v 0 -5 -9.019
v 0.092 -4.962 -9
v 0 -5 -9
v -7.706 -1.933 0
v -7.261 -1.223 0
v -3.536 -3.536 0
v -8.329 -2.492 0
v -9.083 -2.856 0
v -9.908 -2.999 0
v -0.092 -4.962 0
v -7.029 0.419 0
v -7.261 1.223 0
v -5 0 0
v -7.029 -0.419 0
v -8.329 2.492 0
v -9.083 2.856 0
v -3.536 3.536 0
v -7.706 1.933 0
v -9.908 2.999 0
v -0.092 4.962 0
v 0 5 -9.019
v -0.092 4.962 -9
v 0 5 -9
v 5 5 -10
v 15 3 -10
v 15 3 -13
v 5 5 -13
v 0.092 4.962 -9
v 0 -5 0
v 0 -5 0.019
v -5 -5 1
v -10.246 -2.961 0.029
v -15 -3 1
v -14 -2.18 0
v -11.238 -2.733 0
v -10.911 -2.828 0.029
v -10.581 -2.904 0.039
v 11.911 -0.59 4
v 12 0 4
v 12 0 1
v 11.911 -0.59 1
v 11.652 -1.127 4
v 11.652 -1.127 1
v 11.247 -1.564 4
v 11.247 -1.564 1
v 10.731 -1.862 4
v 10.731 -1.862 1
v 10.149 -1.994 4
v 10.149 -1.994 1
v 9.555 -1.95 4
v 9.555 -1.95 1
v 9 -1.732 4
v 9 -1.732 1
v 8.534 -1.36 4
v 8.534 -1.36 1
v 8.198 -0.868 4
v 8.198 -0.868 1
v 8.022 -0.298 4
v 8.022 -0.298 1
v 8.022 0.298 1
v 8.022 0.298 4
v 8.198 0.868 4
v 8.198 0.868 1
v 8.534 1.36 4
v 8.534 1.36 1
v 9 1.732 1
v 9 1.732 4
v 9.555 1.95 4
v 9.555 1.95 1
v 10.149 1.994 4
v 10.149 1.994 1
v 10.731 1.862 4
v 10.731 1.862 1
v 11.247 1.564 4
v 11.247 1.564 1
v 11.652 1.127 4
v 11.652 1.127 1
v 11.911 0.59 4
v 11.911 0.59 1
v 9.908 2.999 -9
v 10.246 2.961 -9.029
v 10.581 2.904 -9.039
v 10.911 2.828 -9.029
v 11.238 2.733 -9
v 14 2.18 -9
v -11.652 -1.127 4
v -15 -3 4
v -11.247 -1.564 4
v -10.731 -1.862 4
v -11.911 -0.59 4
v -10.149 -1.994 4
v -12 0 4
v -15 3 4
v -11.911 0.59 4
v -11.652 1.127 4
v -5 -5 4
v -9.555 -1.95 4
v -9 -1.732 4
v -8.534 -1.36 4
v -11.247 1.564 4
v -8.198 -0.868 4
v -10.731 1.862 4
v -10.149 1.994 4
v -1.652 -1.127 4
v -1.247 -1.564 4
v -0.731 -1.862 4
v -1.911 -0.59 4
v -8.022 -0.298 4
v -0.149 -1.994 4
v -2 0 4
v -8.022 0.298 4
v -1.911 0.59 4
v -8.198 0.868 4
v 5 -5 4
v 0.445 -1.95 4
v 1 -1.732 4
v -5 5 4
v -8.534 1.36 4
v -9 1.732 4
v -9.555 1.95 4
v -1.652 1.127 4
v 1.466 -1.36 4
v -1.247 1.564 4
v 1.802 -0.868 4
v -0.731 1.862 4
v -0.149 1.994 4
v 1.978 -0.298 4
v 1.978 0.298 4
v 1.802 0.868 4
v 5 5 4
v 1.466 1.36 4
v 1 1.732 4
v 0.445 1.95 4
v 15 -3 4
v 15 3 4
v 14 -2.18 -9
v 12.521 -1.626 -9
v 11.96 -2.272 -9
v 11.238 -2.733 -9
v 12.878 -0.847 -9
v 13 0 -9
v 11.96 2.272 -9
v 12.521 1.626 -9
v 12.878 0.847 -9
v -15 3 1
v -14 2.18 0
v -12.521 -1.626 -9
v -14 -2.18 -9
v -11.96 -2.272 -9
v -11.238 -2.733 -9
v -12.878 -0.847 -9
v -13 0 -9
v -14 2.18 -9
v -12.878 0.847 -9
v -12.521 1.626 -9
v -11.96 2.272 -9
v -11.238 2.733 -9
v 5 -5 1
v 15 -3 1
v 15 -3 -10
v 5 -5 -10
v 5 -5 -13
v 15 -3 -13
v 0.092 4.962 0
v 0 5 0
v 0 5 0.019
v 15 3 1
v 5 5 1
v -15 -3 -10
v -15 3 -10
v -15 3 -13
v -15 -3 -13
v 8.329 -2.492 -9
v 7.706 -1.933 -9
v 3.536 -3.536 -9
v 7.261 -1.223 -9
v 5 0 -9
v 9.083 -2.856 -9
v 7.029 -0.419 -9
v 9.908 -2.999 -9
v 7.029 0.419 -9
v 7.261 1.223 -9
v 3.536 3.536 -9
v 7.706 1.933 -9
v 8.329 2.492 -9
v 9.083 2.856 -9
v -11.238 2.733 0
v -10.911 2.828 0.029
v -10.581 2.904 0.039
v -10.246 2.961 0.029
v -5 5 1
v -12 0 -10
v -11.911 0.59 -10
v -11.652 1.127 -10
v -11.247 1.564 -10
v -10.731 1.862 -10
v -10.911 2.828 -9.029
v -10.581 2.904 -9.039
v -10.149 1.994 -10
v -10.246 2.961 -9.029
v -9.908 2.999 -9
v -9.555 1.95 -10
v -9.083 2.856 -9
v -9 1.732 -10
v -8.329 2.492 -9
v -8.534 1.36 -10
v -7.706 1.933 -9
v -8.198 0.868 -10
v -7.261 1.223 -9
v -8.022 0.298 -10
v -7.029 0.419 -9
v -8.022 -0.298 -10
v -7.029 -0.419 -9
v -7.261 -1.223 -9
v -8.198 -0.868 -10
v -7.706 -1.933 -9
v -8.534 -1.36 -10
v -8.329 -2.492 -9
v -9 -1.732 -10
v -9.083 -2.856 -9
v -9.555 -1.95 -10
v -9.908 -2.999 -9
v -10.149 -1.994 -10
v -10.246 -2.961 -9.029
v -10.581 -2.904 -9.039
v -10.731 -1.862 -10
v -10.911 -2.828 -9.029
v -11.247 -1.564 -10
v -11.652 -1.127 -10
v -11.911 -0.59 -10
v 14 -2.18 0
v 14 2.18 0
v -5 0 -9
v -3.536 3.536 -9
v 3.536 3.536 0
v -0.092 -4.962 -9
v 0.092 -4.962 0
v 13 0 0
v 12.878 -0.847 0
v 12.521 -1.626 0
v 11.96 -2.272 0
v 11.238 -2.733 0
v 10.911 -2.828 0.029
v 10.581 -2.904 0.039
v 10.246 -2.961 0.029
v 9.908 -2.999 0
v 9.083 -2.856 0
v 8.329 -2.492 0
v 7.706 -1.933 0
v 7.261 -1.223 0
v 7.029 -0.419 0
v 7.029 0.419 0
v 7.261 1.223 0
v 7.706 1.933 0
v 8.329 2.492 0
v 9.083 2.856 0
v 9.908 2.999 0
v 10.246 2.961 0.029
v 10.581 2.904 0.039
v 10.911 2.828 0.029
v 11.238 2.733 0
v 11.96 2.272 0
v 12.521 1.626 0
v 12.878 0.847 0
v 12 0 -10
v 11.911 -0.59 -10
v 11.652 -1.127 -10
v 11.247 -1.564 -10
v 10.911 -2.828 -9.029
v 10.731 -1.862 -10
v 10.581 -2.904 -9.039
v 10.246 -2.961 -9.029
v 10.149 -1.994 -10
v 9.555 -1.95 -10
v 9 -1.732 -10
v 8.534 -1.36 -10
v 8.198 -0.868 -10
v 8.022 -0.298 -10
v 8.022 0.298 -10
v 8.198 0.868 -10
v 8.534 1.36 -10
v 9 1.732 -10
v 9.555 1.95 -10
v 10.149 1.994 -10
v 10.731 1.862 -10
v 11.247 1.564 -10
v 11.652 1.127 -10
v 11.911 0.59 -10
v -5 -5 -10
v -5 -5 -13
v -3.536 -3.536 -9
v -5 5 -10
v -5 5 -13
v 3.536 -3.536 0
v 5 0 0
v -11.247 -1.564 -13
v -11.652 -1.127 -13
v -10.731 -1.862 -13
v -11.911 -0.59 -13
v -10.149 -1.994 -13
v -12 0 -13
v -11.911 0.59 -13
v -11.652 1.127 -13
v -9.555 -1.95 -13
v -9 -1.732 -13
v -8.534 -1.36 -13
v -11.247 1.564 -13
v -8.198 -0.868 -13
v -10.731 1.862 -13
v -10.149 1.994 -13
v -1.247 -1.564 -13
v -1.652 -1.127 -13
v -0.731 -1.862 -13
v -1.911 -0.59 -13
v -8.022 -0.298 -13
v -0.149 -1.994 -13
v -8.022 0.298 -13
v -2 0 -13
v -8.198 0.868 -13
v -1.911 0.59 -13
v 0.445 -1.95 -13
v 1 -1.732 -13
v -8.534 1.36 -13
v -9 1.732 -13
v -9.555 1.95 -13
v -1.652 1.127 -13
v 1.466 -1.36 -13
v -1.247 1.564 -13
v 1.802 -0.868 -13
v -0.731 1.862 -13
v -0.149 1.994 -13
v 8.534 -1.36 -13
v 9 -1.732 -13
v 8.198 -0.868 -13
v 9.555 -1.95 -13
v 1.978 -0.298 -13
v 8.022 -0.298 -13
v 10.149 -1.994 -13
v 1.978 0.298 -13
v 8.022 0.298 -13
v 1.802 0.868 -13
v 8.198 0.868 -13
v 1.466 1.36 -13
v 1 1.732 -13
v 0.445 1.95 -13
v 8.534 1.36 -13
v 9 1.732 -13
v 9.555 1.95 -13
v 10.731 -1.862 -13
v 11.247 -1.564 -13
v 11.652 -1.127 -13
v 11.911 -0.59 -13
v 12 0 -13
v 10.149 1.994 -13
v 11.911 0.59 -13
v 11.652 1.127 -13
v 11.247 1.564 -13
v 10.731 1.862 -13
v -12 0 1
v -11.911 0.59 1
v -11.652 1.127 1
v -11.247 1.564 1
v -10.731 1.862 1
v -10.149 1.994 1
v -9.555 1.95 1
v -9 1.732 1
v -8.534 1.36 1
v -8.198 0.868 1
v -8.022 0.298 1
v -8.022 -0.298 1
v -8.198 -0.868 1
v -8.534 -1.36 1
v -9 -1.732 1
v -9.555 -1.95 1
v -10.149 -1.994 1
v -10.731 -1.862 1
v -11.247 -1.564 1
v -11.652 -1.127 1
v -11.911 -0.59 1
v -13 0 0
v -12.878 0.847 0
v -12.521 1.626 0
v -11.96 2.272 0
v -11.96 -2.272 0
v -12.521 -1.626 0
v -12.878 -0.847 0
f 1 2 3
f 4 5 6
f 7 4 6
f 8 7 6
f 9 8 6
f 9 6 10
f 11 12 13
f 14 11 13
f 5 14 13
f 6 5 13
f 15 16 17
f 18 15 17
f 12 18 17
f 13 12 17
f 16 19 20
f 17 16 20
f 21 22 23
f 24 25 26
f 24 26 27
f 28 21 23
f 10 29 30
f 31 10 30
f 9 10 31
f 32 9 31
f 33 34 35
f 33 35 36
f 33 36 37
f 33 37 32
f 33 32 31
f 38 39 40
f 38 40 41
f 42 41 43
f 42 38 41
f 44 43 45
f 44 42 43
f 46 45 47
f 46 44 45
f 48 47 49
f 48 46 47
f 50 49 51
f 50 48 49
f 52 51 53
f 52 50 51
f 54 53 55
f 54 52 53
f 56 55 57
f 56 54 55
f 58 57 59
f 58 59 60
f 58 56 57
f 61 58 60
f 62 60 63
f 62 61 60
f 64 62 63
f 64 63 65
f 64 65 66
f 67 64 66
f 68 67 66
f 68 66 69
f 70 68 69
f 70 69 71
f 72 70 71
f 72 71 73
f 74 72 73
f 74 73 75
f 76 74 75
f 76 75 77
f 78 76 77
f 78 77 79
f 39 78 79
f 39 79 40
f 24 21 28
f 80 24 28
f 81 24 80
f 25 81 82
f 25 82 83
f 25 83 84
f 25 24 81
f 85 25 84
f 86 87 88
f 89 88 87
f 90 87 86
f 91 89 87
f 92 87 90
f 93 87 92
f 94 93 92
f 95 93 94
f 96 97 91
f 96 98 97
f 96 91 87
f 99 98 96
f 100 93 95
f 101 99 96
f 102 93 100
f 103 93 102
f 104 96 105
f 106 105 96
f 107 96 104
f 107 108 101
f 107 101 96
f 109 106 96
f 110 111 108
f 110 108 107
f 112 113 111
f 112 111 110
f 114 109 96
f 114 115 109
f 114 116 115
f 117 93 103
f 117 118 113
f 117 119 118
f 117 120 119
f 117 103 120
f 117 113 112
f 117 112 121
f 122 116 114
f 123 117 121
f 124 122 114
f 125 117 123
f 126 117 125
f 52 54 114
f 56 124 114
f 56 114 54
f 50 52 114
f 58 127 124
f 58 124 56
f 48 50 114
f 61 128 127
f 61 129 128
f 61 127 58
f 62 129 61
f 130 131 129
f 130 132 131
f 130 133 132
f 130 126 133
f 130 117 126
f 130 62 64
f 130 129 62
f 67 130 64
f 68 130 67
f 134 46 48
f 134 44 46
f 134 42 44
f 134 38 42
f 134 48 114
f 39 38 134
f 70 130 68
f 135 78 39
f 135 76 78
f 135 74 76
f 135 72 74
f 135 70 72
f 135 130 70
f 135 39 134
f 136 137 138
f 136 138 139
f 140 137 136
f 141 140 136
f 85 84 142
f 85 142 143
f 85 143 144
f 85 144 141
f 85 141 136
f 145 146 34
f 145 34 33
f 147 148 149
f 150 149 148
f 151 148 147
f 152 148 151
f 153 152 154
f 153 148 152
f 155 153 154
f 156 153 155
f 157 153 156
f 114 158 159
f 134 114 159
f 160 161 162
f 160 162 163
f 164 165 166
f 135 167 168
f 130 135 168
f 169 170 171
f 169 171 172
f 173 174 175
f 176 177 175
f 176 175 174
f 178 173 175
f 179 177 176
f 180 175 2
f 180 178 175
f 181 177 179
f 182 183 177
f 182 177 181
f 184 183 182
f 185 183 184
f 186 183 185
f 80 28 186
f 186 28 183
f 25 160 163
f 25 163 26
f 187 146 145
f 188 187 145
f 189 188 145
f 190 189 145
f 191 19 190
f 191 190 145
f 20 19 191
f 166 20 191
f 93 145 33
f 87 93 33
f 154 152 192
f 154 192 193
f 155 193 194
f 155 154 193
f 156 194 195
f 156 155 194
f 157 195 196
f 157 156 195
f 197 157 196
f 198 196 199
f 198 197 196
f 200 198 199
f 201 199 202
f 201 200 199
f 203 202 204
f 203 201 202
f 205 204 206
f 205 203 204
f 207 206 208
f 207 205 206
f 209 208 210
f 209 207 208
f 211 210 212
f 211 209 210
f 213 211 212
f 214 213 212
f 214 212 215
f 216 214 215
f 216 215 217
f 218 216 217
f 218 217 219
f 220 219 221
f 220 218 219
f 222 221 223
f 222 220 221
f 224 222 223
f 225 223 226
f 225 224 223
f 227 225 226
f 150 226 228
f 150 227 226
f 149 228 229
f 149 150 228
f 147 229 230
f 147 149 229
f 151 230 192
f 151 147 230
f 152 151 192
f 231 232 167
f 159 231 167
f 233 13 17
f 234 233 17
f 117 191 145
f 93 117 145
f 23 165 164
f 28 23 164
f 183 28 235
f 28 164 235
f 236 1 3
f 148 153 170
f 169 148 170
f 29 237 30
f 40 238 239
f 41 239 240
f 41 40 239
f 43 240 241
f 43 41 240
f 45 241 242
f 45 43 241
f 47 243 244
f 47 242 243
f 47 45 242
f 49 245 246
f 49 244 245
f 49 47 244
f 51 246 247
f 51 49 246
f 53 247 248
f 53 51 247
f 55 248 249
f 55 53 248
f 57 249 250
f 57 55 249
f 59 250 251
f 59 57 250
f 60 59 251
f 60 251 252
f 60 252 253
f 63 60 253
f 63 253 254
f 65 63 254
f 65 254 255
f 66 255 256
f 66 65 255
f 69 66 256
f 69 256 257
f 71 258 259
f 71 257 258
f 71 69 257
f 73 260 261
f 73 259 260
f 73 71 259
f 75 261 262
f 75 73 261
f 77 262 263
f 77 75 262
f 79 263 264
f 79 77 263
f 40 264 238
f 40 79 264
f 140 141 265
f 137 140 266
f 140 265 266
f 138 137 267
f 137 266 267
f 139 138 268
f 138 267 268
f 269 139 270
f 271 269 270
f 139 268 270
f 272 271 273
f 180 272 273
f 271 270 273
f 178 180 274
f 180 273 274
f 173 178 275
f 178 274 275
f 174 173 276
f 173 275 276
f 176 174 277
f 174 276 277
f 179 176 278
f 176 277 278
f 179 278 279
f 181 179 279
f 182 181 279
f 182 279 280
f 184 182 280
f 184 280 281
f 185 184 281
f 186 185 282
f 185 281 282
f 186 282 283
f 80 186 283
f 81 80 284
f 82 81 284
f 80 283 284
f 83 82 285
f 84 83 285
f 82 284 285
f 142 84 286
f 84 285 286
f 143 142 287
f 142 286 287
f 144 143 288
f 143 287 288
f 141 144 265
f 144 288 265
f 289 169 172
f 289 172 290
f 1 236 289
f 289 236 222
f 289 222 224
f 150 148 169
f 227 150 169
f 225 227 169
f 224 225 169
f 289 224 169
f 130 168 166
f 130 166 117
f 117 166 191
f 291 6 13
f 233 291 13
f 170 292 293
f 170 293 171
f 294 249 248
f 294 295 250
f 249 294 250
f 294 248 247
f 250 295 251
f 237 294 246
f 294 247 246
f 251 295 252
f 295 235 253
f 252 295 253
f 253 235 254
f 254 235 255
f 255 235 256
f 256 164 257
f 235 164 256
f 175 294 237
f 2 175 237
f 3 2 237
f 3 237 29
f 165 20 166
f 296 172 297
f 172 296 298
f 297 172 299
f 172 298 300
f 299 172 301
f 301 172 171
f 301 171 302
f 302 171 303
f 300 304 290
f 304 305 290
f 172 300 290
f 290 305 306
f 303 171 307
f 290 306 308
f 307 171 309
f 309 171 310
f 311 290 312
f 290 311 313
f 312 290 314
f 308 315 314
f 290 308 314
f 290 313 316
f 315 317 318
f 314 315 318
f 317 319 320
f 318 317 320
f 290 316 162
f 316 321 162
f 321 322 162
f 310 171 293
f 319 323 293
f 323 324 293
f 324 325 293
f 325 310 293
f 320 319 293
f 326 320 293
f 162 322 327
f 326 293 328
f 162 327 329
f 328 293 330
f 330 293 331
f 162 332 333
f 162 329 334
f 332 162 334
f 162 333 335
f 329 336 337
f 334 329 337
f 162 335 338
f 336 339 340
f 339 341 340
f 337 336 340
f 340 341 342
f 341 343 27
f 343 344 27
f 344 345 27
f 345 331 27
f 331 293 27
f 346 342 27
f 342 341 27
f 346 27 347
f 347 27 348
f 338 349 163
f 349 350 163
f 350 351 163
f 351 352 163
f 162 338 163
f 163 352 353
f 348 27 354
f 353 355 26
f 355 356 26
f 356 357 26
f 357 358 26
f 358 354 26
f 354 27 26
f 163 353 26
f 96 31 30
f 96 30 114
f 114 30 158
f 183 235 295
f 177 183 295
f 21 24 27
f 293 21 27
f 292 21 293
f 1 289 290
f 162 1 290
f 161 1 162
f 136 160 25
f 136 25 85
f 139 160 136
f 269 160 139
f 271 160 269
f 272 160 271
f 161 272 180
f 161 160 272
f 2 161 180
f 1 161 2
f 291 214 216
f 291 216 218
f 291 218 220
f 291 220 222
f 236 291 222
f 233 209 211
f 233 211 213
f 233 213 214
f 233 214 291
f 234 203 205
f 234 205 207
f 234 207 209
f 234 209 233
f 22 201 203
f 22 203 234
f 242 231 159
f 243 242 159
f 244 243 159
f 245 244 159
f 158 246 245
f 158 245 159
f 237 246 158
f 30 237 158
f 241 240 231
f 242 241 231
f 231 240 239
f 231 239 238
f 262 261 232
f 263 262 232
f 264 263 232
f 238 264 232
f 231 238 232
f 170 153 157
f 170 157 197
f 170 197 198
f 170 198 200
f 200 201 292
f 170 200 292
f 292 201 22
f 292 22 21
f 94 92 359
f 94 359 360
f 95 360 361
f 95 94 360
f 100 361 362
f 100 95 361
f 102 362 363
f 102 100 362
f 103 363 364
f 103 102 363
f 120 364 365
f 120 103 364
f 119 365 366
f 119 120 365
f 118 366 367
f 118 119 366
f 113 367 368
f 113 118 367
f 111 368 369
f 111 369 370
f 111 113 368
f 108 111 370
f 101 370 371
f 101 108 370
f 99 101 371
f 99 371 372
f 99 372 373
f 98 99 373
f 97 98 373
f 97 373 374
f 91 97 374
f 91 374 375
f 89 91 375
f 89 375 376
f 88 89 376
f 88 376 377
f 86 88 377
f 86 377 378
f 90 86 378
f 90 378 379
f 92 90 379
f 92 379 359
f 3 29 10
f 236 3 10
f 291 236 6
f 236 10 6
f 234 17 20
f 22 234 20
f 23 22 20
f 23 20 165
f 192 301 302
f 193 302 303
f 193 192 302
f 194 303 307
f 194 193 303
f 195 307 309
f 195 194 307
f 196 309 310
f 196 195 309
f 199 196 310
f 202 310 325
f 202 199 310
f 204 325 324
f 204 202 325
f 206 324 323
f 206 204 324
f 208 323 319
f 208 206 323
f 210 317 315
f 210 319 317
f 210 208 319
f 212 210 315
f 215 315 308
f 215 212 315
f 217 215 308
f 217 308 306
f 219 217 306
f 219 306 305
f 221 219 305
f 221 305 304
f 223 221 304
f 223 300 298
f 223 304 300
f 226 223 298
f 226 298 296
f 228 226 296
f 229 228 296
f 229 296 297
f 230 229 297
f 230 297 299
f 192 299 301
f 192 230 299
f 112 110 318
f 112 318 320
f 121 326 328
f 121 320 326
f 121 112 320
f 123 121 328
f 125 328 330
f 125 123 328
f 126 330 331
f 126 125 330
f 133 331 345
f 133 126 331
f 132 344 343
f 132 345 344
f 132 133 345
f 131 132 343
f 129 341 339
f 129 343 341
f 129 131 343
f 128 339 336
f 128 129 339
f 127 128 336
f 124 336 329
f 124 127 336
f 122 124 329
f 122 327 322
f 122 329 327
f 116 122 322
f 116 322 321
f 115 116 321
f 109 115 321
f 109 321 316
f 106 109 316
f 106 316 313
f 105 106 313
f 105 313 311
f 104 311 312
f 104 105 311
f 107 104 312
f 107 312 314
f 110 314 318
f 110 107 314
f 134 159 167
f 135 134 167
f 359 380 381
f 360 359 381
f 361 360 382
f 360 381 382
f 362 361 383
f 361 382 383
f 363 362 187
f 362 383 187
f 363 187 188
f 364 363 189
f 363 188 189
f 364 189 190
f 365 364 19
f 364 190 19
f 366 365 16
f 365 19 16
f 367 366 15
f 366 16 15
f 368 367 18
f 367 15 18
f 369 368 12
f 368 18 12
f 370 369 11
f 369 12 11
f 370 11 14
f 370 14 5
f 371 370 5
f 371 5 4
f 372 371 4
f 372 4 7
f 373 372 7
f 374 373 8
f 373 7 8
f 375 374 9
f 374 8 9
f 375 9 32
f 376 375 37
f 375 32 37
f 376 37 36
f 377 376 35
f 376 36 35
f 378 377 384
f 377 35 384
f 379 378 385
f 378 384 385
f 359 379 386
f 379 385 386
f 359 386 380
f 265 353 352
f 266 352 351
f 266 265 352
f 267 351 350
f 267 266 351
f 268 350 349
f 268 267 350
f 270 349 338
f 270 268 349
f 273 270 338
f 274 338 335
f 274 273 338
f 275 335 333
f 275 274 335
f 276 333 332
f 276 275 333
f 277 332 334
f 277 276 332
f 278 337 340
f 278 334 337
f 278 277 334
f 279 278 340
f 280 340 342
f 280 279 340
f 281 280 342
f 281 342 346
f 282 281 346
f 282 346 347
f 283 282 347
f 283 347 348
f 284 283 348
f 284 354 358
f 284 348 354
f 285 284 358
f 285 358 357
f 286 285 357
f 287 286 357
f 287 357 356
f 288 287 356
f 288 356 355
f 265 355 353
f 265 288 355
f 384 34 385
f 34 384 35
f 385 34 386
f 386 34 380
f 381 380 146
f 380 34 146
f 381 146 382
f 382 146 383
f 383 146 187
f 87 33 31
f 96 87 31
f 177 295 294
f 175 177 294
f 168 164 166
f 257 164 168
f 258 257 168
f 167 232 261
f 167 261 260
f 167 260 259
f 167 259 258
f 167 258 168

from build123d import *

# Parameters (mm, degrees)
EXTRUDE_1_DEPTH          = 4
EXTRUDE_2_DEPTH          = 9
CHAMFER_1_SIZE           = 1
CHAMFER_2_SIZE           = 1
CHAMFER_3_SIZE           = 1
CHAMFER_4_SIZE           = 1
CUT_EXTRUDE_1_DEPTH      = 24.216373532
CUT_EXTRUDE_1_DEPTH_BACK = 24.216373532
SKETCH_4_R               = 2
CHAMFER_5_SIZE           = 1


with BuildPart() as part:
    # 草图1 → 凸台-拉伸1 (new body)
    with BuildSketch(Plane.XY):
        Polygon((15, -3), (15, 3), (5, 5), (-5, 5), (-15, 3), (-15, -3), (-5, -5), (5, -5), align=None)
    extrude_1 = extrude(amount=EXTRUDE_1_DEPTH)

    # 草图2 → 凸台-拉伸2 (add)
    with BuildSketch(Plane(origin=(0, 0, 0), x_dir=(-1, 0, 0), z_dir=(0, 0, -1))):
        Polygon((0, 5), (-3.535533906, 3.535533906), (-5, 0), (-3.535533906, -3.535533906), (0, -5), (3.535533906, -3.535533906), (5, 0), (3.535533906, 3.535533906), align=None)
    extrude(amount=EXTRUDE_2_DEPTH)

    # 镜向1: 凸台-拉伸1 across plane
    add(extrude_1.mirror(Plane(origin=(0, 0, -4.5), x_dir=(1, 0, 0), z_dir=(0, 0, -1))))

    # 倒角1
    # the kernel refuses this chamfer: 1 mm, written as the material it takes off along each edge
    with BuildSketch(Plane(origin=(-17.521742642, -2.495651472, 0), x_dir=(0.19611613513818427, 0.9805806756909201, 0), z_dir=(0.9805806756909201, -0.19611613513818427, 0))) as chamfer_1_piece_1_section:
        Polygon((CHAMFER_1_SIZE, 0), (0, CHAMFER_1_SIZE), (0, 0), align=None)
    chamfer_1_piece_1 = extrude(amount=20.484770979, mode=Mode.PRIVATE)
    chamfer_1_piece_1 = split(chamfer_1_piece_1, bisect_by=Plane(origin=(-15.841163755, 1.561624871, 0), z_dir=(-0.3826834323650901, -0.9238795325112866, 0)), keep=Keep.TOP, mode=Mode.PRIVATE)
    add(chamfer_1_piece_1, mode=Mode.SUBTRACT)
    with BuildSketch(Plane(origin=(-15, 5.571682988, 0), x_dir=(1, 0, 0), z_dir=(0, -1, 0))) as chamfer_1_piece_2:
        Polygon((CHAMFER_1_SIZE, 0), (0, CHAMFER_1_SIZE), (0, 0), align=None)
    extrude(amount=11.143365976, mode=Mode.SUBTRACT)
    with BuildSketch(Plane(origin=(2.565227926, 6.513045585, 0), x_dir=(0.1961161351381843, -0.9805806756909201, 0), z_dir=(-0.9805806756909201, -0.19611613513818427, 0))) as chamfer_1_piece_3_section:
        Polygon((CHAMFER_1_SIZE, 0), (0, CHAMFER_1_SIZE), (0, 0), align=None)
    chamfer_1_piece_3 = extrude(amount=20.484770979, mode=Mode.PRIVATE)
    chamfer_1_piece_3 = split(chamfer_1_piece_3, bisect_by=Plane(origin=(2.724501391, 6.128525427, 0), z_dir=(-0.38268343236508795, 0.9238795325112875, 0)), keep=Keep.TOP, mode=Mode.PRIVATE)
    add(chamfer_1_piece_3, mode=Mode.SUBTRACT)

    # 倒角2
    # the kernel refuses this chamfer: 1 mm, written as the material it takes off along each edge
    with BuildSketch(Plane(origin=(-2.565227926, -6.513045585, 0), x_dir=(-0.1961161351381843, 0.9805806756909202, 0), z_dir=(0.9805806756909201, 0.19611613513818427, 0))) as chamfer_2_piece_1_section:
        Polygon((CHAMFER_2_SIZE, 0), (0, CHAMFER_2_SIZE), (0, 0), align=None)
    chamfer_2_piece_1 = extrude(amount=20.484770979, mode=Mode.PRIVATE)
    chamfer_2_piece_1 = split(chamfer_2_piece_1, bisect_by=Plane(origin=(-2.724501391, -6.128525427, 0), z_dir=(0.3826834323650899, -0.9238795325112867, 0)), keep=Keep.TOP, mode=Mode.PRIVATE)
    add(chamfer_2_piece_1, mode=Mode.SUBTRACT)
    with BuildSketch(Plane(origin=(15, -5.571682988, 0), x_dir=(-1, 0, 0), z_dir=(0, 1, 0))) as chamfer_2_piece_2:
        Polygon((CHAMFER_2_SIZE, 0), (0, CHAMFER_2_SIZE), (0, 0), align=None)
    extrude(amount=11.143365976, mode=Mode.SUBTRACT)
    with BuildSketch(Plane(origin=(17.521742642, 2.495651472, 0), x_dir=(-0.19611613513818427, -0.9805806756909201, 0), z_dir=(-0.9805806756909201, 0.19611613513818427, 0))) as chamfer_2_piece_3_section:
        Polygon((CHAMFER_2_SIZE, 0), (0, CHAMFER_2_SIZE), (0, 0), align=None)
    chamfer_2_piece_3 = extrude(amount=20.484770979, mode=Mode.PRIVATE)
    chamfer_2_piece_3 = split(chamfer_2_piece_3, bisect_by=Plane(origin=(15.841163755, -1.561624871, 0), z_dir=(0.38268343236509167, 0.923879532511286, 0)), keep=Keep.TOP, mode=Mode.PRIVATE)
    add(chamfer_2_piece_3, mode=Mode.SUBTRACT)

    # 倒角3
    # the kernel refuses this chamfer: 1 mm, written as the material it takes off along each edge
    with BuildSketch(Plane(origin=(-17.521742642, -2.495651472, -9), x_dir=(0.19611613513818427, 0.9805806756909201, 0), z_dir=(0.9805806756909201, -0.19611613513818427, 0))) as chamfer_3_piece_1_section:
        Polygon((CHAMFER_3_SIZE, 0), (0, -CHAMFER_3_SIZE), (0, 0), align=None)
    chamfer_3_piece_1 = extrude(amount=20.484770979, mode=Mode.PRIVATE)
    chamfer_3_piece_1 = split(chamfer_3_piece_1, bisect_by=Plane(origin=(-15.841163755, 1.561624871, -9), z_dir=(-0.3826834323650901, -0.9238795325112866, 0)), keep=Keep.TOP, mode=Mode.PRIVATE)
    add(chamfer_3_piece_1, mode=Mode.SUBTRACT)
    with BuildSketch(Plane(origin=(-15, 5.571682988, -9), x_dir=(1, 0, 0), z_dir=(0, -1, 0))) as chamfer_3_piece_2:
        Polygon((CHAMFER_3_SIZE, 0), (0, -CHAMFER_3_SIZE), (0, 0), align=None)
    extrude(amount=11.143365976, mode=Mode.SUBTRACT)
    with BuildSketch(Plane(origin=(2.565227926, 6.513045585, -9), x_dir=(0.1961161351381843, -0.9805806756909202, 0), z_dir=(-0.9805806756909201, -0.19611613513818427, 0))) as chamfer_3_piece_3_section:
        Polygon((CHAMFER_3_SIZE, 0), (0, -CHAMFER_3_SIZE), (0, 0), align=None)
    chamfer_3_piece_3 = extrude(amount=20.484770979, mode=Mode.PRIVATE)
    chamfer_3_piece_3 = split(chamfer_3_piece_3, bisect_by=Plane(origin=(2.724501391, 6.128525427, -9), z_dir=(-0.38268343236508795, 0.9238795325112875, 0)), keep=Keep.TOP, mode=Mode.PRIVATE)
    add(chamfer_3_piece_3, mode=Mode.SUBTRACT)

    # 倒角4
    # the kernel refuses this chamfer: 1 mm, written as the material it takes off along each edge
    with BuildSketch(Plane(origin=(-2.565227926, -6.513045585, -9), x_dir=(0, 0, -1), z_dir=(0.9805806756909201, 0.19611613513818427, 0))) as chamfer_4_piece_1_section:
        Polygon((CHAMFER_4_SIZE, 0), (0, CHAMFER_4_SIZE), (0, 0), align=None)
    chamfer_4_piece_1 = extrude(amount=20.484770979, mode=Mode.PRIVATE)
    chamfer_4_piece_1 = split(chamfer_4_piece_1, bisect_by=Plane(origin=(-2.724501391, -6.128525427, -9), z_dir=(0.3826834323650899, -0.9238795325112867, 0)), keep=Keep.TOP, mode=Mode.PRIVATE)
    add(chamfer_4_piece_1, mode=Mode.SUBTRACT)
    with BuildSketch(Plane(origin=(15, -5.571682988, -9), x_dir=(0, 0, -1), z_dir=(0, 1, 0))) as chamfer_4_piece_2:
        Polygon((CHAMFER_4_SIZE, 0), (0, CHAMFER_4_SIZE), (0, 0), align=None)
    extrude(amount=11.143365976, mode=Mode.SUBTRACT)
    with BuildSketch(Plane(origin=(17.521742642, 2.495651472, -9), x_dir=(0, 0, -1), z_dir=(-0.9805806756909201, 0.19611613513818427, 0))) as chamfer_4_piece_3_section:
        Polygon((CHAMFER_4_SIZE, 0), (0, CHAMFER_4_SIZE), (0, 0), align=None)
    chamfer_4_piece_3 = extrude(amount=20.484770979, mode=Mode.PRIVATE)
    chamfer_4_piece_3 = split(chamfer_4_piece_3, bisect_by=Plane(origin=(15.841163755, -1.561624871, -9), z_dir=(0.38268343236509167, 0.923879532511286, 0)), keep=Keep.TOP, mode=Mode.PRIVATE)
    add(chamfer_4_piece_3, mode=Mode.SUBTRACT)

    # 草图4 → 切除-拉伸1 (cut, two sides: drawn at the far end of the back side and taken through both)
    with BuildSketch(Plane(origin=(0, 0, -13), x_dir=(-1, 0, 0), z_dir=(0, 0, -1)).offset(-CUT_EXTRUDE_1_DEPTH_BACK)):
        Circle(SKETCH_4_R)
        with Locations((10, 0)):
            Circle(SKETCH_4_R)
        with Locations(Location((-10, 0, 0), (0, 0, 180))):
            Circle(SKETCH_4_R)
    extrude(amount=CUT_EXTRUDE_1_DEPTH + CUT_EXTRUDE_1_DEPTH_BACK, mode=Mode.SUBTRACT)

    # 倒角5
    # the kernel refuses this chamfer: 1 mm, written as the material it takes off along each edge
    with BuildSketch(Plane(origin=(10, 0, 0), x_dir=(1, 0, 0), z_dir=(0, 1, 0))) as chamfer_5_piece_1:
        Polygon((2 + CHAMFER_5_SIZE, 0), (2, -CHAMFER_5_SIZE), (2, 0), align=None)
    revolve(axis=Axis((10, 0, 0), (0, 0, -1)), mode=Mode.SUBTRACT)
    with BuildSketch(Plane(origin=(10, 0, -9), x_dir=(1, 0, 0), z_dir=(0, 1, 0))) as chamfer_5_piece_2:
        Polygon((2 + CHAMFER_5_SIZE, 0), (2, CHAMFER_5_SIZE), (2, 0), align=None)
    revolve(axis=Axis((10, 0, -9), (0, 0, -1)), mode=Mode.SUBTRACT)
    with BuildSketch(Plane(origin=(-10, 0, -9), x_dir=(-1, 0, 0), z_dir=(0, -1, 0))) as chamfer_5_piece_3:
        Polygon((2, CHAMFER_5_SIZE), (2 + CHAMFER_5_SIZE, 0), (2, 0), align=None)
    revolve(axis=Axis((-10, 0, -9), (0, 0, -1)), mode=Mode.SUBTRACT)
    with BuildSketch(Plane(origin=(-10, 0, 0), x_dir=(-1, 0, 0), z_dir=(0, -1, 0))) as chamfer_5_piece_4:
        Polygon((2, -CHAMFER_5_SIZE), (2 + CHAMFER_5_SIZE, 0), (2, 0), align=None)
    revolve(axis=Axis((-10, 0, 0), (0, 0, -1)), mode=Mode.SUBTRACT)


solid = part.part
